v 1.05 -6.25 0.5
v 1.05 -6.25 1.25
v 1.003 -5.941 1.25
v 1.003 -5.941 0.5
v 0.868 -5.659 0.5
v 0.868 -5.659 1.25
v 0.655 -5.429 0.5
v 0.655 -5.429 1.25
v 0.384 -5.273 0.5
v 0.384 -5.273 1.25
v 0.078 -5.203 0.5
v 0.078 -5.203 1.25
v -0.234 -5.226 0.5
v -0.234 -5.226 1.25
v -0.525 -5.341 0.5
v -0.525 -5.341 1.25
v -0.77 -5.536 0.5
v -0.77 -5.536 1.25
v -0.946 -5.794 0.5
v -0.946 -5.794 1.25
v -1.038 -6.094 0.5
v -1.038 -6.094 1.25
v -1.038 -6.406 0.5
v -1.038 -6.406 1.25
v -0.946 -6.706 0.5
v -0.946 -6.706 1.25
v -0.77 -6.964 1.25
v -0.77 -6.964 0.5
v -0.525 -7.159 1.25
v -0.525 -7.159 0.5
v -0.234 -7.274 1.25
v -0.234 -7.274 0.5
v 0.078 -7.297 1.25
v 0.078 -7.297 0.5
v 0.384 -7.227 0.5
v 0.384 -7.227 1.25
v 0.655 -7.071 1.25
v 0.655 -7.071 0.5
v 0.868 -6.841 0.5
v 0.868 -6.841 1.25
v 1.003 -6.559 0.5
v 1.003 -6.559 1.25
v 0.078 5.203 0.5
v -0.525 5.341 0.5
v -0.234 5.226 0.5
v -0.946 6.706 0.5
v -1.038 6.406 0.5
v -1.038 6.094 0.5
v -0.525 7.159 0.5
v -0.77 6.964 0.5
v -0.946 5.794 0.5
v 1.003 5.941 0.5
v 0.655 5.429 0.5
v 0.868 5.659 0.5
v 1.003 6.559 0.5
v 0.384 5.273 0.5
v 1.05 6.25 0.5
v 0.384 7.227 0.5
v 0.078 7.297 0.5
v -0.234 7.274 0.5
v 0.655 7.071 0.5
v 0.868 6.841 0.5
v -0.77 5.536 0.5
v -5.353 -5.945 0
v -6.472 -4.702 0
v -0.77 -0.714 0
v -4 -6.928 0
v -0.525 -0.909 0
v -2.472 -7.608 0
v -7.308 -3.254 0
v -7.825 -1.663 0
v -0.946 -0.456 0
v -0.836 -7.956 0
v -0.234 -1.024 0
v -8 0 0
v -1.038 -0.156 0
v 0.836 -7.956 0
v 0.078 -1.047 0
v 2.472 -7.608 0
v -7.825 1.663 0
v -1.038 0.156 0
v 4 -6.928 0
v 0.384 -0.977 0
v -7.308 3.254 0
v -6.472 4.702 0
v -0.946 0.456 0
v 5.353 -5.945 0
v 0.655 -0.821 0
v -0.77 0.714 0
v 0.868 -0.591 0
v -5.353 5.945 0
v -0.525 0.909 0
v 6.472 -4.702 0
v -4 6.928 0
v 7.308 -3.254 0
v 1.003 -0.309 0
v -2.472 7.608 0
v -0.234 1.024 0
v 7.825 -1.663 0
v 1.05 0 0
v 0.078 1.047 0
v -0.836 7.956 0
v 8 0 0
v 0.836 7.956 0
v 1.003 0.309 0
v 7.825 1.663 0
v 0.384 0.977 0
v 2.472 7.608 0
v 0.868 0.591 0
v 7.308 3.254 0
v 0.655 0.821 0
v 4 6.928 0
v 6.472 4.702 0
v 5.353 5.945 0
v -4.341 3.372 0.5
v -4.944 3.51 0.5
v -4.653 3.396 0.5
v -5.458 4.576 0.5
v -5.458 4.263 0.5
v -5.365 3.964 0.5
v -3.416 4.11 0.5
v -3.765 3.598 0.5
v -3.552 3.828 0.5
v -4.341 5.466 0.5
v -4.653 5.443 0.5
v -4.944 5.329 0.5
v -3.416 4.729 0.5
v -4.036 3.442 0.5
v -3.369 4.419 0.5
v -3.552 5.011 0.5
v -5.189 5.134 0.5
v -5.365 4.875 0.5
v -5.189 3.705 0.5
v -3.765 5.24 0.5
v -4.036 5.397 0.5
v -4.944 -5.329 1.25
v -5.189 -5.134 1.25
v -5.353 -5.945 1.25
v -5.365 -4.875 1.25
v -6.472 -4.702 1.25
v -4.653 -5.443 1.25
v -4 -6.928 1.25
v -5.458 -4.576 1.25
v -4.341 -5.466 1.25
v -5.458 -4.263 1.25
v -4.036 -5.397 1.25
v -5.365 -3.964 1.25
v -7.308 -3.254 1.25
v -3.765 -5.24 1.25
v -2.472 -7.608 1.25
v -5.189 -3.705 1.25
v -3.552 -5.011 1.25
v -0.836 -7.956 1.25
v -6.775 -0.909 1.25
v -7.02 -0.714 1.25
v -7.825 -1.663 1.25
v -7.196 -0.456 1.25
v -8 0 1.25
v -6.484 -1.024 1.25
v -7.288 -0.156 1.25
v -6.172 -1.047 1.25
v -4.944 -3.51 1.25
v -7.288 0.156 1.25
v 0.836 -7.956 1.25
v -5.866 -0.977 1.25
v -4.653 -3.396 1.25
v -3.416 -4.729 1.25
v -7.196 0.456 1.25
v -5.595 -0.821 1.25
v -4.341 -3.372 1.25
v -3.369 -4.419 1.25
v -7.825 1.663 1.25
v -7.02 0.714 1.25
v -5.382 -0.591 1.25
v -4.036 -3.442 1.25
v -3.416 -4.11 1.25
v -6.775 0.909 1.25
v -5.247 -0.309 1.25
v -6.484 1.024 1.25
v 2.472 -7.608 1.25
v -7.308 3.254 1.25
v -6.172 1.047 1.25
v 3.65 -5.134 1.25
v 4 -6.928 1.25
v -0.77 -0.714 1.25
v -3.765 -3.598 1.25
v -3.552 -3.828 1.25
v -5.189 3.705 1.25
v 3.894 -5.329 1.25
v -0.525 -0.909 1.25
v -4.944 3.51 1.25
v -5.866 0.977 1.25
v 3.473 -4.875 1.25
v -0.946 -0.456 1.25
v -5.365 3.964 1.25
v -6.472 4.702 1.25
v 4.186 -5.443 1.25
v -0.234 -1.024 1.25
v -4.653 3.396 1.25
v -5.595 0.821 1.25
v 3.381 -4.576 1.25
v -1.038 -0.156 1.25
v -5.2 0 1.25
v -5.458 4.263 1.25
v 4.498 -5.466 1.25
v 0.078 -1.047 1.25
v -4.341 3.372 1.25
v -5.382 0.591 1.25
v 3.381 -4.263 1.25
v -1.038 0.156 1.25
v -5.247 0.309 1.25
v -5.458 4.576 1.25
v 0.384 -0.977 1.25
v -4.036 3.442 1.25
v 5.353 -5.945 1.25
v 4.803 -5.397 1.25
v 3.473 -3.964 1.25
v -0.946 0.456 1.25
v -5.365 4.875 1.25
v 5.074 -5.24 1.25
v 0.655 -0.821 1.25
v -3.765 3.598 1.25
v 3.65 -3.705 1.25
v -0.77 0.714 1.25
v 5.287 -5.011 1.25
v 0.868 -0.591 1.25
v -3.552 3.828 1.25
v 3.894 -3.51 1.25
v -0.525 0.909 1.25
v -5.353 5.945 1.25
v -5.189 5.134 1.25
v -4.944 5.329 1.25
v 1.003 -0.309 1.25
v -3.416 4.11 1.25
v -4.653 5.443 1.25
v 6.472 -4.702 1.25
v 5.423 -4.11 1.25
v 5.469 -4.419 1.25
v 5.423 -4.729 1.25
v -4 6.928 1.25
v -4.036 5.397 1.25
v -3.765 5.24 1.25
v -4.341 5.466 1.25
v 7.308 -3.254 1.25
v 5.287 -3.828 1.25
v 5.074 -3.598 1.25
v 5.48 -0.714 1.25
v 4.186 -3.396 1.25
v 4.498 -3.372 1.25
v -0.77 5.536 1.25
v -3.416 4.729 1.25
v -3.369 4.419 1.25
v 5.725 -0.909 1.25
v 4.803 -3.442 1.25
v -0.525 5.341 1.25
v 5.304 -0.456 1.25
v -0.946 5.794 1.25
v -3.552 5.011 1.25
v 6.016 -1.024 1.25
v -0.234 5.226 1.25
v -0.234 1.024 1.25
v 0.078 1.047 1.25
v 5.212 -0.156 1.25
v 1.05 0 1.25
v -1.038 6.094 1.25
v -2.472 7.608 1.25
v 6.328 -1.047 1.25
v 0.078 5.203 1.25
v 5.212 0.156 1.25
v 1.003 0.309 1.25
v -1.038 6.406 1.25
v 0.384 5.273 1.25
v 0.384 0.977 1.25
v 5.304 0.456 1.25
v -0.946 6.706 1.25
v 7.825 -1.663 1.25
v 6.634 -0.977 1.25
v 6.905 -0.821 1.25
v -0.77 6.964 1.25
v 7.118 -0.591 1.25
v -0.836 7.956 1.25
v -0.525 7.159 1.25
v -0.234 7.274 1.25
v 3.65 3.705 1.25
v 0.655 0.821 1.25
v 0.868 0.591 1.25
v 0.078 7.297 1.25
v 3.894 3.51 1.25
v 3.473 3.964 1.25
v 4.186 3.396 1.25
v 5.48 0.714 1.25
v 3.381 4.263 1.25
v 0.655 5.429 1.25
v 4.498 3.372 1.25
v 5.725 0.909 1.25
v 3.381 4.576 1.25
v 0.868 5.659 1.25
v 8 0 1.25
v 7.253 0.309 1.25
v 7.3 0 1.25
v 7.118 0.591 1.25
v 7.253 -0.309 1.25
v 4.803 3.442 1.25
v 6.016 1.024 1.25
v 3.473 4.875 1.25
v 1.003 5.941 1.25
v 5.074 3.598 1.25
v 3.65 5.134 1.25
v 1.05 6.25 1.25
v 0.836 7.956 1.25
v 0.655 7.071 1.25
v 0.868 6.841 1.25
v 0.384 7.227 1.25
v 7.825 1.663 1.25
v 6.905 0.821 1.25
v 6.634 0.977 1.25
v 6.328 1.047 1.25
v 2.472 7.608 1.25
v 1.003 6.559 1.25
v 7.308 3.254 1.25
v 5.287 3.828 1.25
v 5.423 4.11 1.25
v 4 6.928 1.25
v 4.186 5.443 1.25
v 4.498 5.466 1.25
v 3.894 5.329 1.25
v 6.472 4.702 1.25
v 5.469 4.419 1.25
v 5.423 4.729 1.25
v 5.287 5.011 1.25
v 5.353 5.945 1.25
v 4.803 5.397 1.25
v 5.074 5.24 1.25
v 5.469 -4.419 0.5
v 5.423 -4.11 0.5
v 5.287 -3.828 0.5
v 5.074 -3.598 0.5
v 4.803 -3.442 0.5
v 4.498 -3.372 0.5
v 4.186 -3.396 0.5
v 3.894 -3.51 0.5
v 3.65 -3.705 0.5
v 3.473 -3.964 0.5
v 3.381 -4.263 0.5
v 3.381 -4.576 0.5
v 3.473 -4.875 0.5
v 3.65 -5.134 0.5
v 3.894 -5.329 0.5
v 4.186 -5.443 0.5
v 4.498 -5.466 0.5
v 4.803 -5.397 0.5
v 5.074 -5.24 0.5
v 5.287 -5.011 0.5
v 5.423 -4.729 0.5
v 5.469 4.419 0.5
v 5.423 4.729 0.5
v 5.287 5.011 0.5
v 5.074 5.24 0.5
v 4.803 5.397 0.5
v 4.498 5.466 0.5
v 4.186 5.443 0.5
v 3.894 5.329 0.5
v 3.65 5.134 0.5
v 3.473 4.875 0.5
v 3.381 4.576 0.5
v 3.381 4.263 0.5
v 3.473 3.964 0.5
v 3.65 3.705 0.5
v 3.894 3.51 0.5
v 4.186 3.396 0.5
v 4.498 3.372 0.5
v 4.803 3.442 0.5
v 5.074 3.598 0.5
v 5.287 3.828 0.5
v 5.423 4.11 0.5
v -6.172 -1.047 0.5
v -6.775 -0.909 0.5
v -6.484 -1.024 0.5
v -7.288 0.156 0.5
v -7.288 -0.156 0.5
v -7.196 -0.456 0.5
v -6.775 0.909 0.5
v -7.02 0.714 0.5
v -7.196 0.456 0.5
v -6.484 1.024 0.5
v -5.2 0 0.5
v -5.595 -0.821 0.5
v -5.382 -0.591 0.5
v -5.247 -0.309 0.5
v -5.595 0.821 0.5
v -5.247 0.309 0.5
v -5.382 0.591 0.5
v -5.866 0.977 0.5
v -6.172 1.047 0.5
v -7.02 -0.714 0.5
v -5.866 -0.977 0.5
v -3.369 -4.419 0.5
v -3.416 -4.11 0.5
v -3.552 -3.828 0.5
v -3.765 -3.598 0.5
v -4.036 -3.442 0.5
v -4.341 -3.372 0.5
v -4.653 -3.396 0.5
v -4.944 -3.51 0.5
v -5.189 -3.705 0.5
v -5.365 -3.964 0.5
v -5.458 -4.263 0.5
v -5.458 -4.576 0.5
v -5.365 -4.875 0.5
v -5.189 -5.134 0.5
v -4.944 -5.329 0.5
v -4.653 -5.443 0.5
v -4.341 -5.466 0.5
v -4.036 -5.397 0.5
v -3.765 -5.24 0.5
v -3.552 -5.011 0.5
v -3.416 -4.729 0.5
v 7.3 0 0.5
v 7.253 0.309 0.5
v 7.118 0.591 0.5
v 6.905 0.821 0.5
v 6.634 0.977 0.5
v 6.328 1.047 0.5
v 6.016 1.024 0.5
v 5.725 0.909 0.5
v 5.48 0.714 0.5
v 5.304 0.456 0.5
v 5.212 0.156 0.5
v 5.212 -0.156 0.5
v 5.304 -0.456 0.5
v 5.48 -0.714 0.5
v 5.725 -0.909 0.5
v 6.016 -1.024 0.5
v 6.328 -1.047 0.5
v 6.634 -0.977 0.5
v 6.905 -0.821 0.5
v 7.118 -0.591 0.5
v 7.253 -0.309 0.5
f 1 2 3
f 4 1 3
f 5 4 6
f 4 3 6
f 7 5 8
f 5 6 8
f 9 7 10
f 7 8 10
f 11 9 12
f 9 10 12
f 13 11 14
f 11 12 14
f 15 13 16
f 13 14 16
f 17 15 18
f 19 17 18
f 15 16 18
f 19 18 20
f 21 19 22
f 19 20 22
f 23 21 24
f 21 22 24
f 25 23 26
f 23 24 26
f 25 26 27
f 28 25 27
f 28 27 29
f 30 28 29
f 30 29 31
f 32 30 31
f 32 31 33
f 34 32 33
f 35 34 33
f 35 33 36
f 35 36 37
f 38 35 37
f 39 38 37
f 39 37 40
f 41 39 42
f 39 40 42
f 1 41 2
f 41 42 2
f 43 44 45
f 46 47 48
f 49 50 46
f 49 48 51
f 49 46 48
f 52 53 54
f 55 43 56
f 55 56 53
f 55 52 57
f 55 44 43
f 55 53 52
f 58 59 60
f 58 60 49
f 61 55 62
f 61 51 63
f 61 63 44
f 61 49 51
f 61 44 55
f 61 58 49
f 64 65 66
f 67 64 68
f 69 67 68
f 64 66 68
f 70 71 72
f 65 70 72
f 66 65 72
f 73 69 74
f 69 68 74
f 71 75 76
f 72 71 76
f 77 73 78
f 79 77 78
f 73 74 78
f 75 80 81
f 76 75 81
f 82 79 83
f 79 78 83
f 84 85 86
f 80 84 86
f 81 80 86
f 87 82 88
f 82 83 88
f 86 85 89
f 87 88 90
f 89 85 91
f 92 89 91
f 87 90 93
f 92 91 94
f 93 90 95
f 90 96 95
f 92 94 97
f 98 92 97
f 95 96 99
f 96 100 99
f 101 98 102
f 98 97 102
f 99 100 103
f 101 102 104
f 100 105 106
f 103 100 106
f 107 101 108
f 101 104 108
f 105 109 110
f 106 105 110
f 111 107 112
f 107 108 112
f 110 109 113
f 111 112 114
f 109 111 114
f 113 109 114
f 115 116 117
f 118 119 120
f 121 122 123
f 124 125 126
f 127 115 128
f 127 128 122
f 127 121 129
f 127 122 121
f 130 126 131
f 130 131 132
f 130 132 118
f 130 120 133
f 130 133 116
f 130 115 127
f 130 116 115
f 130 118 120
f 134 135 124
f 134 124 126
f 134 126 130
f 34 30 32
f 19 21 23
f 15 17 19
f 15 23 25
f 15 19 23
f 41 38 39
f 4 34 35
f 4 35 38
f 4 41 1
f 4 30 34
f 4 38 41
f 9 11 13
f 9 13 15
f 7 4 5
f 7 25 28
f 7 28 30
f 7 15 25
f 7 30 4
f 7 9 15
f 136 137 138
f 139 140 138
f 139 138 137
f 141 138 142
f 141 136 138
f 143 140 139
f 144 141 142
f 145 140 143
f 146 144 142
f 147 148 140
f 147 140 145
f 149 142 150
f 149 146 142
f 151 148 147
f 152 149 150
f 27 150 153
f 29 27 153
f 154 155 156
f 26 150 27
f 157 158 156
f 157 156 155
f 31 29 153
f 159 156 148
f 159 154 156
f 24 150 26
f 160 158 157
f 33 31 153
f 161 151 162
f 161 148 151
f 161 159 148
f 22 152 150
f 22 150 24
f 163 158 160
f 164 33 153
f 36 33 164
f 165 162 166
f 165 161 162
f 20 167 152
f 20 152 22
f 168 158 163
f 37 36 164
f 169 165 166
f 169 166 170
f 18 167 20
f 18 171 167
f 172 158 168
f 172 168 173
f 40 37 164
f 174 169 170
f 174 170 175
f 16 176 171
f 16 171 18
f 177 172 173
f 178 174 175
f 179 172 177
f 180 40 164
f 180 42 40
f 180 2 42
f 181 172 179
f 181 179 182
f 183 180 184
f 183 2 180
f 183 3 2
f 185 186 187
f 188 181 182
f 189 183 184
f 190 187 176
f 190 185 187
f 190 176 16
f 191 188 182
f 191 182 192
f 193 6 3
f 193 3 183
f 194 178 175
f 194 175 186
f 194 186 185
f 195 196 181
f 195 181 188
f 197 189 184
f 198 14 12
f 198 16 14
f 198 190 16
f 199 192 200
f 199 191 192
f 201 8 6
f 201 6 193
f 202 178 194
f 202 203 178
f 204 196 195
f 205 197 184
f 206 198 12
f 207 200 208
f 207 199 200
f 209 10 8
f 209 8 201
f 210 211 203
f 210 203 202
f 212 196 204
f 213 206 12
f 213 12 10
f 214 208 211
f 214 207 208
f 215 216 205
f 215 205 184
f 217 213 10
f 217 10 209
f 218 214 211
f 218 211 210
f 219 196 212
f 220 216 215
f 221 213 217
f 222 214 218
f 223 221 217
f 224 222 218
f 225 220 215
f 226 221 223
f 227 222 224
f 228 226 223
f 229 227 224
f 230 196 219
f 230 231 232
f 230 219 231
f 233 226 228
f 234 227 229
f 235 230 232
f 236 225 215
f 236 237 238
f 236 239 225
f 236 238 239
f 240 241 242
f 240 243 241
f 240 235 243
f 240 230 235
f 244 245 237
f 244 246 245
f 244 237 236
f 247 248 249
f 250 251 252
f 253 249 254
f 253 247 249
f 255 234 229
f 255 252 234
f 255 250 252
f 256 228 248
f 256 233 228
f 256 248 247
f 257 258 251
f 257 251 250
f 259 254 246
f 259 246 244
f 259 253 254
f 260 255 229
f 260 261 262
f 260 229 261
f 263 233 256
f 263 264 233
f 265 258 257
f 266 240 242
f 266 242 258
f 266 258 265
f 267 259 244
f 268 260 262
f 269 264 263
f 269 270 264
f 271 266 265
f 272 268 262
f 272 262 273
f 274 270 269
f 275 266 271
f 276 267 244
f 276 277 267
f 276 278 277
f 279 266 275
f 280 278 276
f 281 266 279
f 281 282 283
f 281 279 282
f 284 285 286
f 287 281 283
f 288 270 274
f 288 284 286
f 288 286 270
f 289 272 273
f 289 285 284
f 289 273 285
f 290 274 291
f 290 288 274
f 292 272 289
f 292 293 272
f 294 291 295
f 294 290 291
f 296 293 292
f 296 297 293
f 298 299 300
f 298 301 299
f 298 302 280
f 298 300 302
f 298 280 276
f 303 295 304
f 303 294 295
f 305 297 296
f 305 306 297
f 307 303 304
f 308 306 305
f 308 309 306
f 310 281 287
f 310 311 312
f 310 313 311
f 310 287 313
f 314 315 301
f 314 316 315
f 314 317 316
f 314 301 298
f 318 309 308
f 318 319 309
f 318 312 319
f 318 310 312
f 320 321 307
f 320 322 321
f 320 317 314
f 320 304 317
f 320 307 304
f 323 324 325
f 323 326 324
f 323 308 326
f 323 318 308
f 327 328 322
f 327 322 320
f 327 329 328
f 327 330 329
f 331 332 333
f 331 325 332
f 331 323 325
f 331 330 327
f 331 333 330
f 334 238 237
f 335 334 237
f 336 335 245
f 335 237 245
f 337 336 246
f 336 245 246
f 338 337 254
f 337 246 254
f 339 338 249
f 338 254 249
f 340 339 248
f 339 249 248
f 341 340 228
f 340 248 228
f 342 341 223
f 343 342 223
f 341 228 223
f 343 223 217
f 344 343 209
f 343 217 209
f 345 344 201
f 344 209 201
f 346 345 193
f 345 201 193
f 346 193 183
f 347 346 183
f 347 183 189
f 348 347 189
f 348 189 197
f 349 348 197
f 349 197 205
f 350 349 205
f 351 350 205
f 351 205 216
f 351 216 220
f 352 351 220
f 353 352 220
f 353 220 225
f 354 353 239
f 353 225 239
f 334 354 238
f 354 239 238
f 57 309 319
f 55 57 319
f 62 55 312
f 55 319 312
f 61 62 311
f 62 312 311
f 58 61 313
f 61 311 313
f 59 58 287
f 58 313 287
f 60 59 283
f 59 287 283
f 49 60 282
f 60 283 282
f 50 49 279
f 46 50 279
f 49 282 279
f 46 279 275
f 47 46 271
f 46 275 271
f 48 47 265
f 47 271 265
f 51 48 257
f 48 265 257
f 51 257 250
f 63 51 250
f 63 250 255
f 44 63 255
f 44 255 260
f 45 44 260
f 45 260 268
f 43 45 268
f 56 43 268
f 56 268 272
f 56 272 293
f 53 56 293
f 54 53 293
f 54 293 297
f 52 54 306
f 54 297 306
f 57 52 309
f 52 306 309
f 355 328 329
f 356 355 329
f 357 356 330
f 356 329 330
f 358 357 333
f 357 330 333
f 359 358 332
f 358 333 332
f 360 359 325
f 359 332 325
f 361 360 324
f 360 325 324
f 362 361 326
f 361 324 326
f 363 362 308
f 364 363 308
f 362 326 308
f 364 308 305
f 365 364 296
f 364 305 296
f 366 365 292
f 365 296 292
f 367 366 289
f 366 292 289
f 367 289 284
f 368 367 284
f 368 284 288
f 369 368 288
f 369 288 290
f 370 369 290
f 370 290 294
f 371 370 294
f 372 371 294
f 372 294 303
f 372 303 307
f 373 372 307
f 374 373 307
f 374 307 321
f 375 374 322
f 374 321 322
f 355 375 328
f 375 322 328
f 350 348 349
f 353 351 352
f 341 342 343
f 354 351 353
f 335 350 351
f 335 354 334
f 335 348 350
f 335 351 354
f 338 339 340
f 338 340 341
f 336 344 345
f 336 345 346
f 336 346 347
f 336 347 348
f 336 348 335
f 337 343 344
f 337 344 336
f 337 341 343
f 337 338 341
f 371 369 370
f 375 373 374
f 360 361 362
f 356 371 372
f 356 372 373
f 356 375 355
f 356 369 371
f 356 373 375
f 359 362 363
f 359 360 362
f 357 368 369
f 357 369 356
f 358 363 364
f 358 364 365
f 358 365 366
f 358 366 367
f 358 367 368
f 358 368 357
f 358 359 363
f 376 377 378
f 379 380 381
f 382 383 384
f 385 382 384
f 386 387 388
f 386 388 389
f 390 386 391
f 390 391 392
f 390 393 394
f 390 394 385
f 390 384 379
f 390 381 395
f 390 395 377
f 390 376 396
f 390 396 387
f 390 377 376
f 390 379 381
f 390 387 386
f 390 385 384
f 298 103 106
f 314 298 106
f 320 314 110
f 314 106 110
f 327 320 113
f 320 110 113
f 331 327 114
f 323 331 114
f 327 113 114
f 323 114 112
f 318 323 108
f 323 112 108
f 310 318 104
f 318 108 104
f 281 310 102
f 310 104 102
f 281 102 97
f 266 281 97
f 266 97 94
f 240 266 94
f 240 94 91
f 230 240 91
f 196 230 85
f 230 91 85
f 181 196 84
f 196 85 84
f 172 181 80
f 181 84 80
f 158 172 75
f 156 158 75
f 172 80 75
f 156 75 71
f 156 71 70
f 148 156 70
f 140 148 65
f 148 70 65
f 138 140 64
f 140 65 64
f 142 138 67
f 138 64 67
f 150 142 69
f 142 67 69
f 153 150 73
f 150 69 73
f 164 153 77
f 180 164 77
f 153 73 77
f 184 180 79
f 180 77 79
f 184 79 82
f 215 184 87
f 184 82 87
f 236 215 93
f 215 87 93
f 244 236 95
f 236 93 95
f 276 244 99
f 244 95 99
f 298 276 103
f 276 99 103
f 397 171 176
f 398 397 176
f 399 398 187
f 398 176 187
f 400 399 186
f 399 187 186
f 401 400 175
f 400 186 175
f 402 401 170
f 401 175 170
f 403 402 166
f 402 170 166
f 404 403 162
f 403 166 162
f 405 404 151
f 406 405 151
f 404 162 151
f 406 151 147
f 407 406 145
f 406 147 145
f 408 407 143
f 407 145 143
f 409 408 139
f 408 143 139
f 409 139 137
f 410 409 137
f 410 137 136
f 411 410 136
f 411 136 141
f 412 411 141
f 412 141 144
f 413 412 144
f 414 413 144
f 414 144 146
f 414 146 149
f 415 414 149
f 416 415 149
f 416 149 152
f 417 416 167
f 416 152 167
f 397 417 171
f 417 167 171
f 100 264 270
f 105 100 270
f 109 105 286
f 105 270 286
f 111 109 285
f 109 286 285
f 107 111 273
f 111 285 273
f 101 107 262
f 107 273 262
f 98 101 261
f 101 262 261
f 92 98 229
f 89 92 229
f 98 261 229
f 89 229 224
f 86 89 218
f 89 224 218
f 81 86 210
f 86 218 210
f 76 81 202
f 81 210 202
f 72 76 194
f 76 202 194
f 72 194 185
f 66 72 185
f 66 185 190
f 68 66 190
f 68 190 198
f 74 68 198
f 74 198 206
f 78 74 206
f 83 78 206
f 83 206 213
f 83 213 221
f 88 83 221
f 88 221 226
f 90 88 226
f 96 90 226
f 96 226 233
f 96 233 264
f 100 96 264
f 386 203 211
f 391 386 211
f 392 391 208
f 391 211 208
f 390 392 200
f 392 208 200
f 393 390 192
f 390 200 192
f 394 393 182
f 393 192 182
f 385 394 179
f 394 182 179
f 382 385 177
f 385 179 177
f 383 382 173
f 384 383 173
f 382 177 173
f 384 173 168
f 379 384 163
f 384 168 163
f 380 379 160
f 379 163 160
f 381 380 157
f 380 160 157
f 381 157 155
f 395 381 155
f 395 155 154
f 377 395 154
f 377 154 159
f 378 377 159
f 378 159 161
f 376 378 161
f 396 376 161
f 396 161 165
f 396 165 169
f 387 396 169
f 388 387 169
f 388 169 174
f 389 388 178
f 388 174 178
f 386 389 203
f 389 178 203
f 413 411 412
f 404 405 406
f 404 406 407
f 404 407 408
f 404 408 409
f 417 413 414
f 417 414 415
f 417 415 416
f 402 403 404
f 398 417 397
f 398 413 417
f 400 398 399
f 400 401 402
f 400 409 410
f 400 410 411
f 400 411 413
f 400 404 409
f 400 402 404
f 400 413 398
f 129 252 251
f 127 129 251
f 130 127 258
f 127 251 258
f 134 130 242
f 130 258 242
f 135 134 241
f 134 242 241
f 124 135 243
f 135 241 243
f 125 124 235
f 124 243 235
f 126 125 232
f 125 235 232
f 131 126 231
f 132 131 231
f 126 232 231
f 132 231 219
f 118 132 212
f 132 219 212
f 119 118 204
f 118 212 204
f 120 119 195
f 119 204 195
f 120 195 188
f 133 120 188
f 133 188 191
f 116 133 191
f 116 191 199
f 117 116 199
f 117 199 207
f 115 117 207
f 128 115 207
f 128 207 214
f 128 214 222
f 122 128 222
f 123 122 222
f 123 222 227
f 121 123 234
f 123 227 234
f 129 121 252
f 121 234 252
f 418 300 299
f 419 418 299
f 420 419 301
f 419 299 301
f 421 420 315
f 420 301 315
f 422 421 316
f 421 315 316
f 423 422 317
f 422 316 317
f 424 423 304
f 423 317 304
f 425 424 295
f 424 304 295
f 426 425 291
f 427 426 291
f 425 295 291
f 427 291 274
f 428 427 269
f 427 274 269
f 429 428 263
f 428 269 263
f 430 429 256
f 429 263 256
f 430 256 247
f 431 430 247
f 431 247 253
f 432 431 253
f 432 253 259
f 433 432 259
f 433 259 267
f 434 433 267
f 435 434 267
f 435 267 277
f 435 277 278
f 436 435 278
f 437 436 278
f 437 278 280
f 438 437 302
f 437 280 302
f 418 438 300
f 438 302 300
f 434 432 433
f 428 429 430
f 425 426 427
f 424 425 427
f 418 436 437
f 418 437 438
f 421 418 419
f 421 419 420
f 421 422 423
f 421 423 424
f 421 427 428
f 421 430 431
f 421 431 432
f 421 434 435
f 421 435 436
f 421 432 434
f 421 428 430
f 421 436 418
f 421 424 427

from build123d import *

# Parameters (mm, degrees)
F0_R     = 8
F1_DEPTH = 1.25
F2_R     = 1.05
F3_DEPTH = 25
F4_R     = 1.05
F5_DEPTH = 0.75


with BuildPart() as f1:
    # F0 (on Top) → F1 (new body)
    with BuildSketch(Plane.XY):
        Circle(F0_R)
    extrude(amount=F1_DEPTH)

    # F2 (on face) → F3 (cut)
    with BuildSketch(Plane.XY.offset(1.25)):
        Circle(F2_R)
    extrude(amount=-F3_DEPTH, mode=Mode.SUBTRACT)

    # F4 (on face) → F5 (cut)
    with BuildSketch(Plane.XY.offset(1.25)):
        with Locations((0, 6.25)):
            Circle(F4_R)
        with Locations((-4.419417, 4.419417)):
            Circle(F4_R)
        with Locations((-6.25, 0)):
            Circle(F4_R)
        with Locations((-4.419417, -4.419417)):
            Circle(F4_R)
        with Locations((0, -6.25)):
            Circle(F4_R)
        with Locations((4.419417, -4.419417)):
            Circle(F4_R)
        with Locations((6.25, 0)):
            Circle(F4_R)
        with Locations((4.419417, 4.419417)):
            Circle(F4_R)
    extrude(amount=-F5_DEPTH, mode=Mode.SUBTRACT)


solid = f1.part
